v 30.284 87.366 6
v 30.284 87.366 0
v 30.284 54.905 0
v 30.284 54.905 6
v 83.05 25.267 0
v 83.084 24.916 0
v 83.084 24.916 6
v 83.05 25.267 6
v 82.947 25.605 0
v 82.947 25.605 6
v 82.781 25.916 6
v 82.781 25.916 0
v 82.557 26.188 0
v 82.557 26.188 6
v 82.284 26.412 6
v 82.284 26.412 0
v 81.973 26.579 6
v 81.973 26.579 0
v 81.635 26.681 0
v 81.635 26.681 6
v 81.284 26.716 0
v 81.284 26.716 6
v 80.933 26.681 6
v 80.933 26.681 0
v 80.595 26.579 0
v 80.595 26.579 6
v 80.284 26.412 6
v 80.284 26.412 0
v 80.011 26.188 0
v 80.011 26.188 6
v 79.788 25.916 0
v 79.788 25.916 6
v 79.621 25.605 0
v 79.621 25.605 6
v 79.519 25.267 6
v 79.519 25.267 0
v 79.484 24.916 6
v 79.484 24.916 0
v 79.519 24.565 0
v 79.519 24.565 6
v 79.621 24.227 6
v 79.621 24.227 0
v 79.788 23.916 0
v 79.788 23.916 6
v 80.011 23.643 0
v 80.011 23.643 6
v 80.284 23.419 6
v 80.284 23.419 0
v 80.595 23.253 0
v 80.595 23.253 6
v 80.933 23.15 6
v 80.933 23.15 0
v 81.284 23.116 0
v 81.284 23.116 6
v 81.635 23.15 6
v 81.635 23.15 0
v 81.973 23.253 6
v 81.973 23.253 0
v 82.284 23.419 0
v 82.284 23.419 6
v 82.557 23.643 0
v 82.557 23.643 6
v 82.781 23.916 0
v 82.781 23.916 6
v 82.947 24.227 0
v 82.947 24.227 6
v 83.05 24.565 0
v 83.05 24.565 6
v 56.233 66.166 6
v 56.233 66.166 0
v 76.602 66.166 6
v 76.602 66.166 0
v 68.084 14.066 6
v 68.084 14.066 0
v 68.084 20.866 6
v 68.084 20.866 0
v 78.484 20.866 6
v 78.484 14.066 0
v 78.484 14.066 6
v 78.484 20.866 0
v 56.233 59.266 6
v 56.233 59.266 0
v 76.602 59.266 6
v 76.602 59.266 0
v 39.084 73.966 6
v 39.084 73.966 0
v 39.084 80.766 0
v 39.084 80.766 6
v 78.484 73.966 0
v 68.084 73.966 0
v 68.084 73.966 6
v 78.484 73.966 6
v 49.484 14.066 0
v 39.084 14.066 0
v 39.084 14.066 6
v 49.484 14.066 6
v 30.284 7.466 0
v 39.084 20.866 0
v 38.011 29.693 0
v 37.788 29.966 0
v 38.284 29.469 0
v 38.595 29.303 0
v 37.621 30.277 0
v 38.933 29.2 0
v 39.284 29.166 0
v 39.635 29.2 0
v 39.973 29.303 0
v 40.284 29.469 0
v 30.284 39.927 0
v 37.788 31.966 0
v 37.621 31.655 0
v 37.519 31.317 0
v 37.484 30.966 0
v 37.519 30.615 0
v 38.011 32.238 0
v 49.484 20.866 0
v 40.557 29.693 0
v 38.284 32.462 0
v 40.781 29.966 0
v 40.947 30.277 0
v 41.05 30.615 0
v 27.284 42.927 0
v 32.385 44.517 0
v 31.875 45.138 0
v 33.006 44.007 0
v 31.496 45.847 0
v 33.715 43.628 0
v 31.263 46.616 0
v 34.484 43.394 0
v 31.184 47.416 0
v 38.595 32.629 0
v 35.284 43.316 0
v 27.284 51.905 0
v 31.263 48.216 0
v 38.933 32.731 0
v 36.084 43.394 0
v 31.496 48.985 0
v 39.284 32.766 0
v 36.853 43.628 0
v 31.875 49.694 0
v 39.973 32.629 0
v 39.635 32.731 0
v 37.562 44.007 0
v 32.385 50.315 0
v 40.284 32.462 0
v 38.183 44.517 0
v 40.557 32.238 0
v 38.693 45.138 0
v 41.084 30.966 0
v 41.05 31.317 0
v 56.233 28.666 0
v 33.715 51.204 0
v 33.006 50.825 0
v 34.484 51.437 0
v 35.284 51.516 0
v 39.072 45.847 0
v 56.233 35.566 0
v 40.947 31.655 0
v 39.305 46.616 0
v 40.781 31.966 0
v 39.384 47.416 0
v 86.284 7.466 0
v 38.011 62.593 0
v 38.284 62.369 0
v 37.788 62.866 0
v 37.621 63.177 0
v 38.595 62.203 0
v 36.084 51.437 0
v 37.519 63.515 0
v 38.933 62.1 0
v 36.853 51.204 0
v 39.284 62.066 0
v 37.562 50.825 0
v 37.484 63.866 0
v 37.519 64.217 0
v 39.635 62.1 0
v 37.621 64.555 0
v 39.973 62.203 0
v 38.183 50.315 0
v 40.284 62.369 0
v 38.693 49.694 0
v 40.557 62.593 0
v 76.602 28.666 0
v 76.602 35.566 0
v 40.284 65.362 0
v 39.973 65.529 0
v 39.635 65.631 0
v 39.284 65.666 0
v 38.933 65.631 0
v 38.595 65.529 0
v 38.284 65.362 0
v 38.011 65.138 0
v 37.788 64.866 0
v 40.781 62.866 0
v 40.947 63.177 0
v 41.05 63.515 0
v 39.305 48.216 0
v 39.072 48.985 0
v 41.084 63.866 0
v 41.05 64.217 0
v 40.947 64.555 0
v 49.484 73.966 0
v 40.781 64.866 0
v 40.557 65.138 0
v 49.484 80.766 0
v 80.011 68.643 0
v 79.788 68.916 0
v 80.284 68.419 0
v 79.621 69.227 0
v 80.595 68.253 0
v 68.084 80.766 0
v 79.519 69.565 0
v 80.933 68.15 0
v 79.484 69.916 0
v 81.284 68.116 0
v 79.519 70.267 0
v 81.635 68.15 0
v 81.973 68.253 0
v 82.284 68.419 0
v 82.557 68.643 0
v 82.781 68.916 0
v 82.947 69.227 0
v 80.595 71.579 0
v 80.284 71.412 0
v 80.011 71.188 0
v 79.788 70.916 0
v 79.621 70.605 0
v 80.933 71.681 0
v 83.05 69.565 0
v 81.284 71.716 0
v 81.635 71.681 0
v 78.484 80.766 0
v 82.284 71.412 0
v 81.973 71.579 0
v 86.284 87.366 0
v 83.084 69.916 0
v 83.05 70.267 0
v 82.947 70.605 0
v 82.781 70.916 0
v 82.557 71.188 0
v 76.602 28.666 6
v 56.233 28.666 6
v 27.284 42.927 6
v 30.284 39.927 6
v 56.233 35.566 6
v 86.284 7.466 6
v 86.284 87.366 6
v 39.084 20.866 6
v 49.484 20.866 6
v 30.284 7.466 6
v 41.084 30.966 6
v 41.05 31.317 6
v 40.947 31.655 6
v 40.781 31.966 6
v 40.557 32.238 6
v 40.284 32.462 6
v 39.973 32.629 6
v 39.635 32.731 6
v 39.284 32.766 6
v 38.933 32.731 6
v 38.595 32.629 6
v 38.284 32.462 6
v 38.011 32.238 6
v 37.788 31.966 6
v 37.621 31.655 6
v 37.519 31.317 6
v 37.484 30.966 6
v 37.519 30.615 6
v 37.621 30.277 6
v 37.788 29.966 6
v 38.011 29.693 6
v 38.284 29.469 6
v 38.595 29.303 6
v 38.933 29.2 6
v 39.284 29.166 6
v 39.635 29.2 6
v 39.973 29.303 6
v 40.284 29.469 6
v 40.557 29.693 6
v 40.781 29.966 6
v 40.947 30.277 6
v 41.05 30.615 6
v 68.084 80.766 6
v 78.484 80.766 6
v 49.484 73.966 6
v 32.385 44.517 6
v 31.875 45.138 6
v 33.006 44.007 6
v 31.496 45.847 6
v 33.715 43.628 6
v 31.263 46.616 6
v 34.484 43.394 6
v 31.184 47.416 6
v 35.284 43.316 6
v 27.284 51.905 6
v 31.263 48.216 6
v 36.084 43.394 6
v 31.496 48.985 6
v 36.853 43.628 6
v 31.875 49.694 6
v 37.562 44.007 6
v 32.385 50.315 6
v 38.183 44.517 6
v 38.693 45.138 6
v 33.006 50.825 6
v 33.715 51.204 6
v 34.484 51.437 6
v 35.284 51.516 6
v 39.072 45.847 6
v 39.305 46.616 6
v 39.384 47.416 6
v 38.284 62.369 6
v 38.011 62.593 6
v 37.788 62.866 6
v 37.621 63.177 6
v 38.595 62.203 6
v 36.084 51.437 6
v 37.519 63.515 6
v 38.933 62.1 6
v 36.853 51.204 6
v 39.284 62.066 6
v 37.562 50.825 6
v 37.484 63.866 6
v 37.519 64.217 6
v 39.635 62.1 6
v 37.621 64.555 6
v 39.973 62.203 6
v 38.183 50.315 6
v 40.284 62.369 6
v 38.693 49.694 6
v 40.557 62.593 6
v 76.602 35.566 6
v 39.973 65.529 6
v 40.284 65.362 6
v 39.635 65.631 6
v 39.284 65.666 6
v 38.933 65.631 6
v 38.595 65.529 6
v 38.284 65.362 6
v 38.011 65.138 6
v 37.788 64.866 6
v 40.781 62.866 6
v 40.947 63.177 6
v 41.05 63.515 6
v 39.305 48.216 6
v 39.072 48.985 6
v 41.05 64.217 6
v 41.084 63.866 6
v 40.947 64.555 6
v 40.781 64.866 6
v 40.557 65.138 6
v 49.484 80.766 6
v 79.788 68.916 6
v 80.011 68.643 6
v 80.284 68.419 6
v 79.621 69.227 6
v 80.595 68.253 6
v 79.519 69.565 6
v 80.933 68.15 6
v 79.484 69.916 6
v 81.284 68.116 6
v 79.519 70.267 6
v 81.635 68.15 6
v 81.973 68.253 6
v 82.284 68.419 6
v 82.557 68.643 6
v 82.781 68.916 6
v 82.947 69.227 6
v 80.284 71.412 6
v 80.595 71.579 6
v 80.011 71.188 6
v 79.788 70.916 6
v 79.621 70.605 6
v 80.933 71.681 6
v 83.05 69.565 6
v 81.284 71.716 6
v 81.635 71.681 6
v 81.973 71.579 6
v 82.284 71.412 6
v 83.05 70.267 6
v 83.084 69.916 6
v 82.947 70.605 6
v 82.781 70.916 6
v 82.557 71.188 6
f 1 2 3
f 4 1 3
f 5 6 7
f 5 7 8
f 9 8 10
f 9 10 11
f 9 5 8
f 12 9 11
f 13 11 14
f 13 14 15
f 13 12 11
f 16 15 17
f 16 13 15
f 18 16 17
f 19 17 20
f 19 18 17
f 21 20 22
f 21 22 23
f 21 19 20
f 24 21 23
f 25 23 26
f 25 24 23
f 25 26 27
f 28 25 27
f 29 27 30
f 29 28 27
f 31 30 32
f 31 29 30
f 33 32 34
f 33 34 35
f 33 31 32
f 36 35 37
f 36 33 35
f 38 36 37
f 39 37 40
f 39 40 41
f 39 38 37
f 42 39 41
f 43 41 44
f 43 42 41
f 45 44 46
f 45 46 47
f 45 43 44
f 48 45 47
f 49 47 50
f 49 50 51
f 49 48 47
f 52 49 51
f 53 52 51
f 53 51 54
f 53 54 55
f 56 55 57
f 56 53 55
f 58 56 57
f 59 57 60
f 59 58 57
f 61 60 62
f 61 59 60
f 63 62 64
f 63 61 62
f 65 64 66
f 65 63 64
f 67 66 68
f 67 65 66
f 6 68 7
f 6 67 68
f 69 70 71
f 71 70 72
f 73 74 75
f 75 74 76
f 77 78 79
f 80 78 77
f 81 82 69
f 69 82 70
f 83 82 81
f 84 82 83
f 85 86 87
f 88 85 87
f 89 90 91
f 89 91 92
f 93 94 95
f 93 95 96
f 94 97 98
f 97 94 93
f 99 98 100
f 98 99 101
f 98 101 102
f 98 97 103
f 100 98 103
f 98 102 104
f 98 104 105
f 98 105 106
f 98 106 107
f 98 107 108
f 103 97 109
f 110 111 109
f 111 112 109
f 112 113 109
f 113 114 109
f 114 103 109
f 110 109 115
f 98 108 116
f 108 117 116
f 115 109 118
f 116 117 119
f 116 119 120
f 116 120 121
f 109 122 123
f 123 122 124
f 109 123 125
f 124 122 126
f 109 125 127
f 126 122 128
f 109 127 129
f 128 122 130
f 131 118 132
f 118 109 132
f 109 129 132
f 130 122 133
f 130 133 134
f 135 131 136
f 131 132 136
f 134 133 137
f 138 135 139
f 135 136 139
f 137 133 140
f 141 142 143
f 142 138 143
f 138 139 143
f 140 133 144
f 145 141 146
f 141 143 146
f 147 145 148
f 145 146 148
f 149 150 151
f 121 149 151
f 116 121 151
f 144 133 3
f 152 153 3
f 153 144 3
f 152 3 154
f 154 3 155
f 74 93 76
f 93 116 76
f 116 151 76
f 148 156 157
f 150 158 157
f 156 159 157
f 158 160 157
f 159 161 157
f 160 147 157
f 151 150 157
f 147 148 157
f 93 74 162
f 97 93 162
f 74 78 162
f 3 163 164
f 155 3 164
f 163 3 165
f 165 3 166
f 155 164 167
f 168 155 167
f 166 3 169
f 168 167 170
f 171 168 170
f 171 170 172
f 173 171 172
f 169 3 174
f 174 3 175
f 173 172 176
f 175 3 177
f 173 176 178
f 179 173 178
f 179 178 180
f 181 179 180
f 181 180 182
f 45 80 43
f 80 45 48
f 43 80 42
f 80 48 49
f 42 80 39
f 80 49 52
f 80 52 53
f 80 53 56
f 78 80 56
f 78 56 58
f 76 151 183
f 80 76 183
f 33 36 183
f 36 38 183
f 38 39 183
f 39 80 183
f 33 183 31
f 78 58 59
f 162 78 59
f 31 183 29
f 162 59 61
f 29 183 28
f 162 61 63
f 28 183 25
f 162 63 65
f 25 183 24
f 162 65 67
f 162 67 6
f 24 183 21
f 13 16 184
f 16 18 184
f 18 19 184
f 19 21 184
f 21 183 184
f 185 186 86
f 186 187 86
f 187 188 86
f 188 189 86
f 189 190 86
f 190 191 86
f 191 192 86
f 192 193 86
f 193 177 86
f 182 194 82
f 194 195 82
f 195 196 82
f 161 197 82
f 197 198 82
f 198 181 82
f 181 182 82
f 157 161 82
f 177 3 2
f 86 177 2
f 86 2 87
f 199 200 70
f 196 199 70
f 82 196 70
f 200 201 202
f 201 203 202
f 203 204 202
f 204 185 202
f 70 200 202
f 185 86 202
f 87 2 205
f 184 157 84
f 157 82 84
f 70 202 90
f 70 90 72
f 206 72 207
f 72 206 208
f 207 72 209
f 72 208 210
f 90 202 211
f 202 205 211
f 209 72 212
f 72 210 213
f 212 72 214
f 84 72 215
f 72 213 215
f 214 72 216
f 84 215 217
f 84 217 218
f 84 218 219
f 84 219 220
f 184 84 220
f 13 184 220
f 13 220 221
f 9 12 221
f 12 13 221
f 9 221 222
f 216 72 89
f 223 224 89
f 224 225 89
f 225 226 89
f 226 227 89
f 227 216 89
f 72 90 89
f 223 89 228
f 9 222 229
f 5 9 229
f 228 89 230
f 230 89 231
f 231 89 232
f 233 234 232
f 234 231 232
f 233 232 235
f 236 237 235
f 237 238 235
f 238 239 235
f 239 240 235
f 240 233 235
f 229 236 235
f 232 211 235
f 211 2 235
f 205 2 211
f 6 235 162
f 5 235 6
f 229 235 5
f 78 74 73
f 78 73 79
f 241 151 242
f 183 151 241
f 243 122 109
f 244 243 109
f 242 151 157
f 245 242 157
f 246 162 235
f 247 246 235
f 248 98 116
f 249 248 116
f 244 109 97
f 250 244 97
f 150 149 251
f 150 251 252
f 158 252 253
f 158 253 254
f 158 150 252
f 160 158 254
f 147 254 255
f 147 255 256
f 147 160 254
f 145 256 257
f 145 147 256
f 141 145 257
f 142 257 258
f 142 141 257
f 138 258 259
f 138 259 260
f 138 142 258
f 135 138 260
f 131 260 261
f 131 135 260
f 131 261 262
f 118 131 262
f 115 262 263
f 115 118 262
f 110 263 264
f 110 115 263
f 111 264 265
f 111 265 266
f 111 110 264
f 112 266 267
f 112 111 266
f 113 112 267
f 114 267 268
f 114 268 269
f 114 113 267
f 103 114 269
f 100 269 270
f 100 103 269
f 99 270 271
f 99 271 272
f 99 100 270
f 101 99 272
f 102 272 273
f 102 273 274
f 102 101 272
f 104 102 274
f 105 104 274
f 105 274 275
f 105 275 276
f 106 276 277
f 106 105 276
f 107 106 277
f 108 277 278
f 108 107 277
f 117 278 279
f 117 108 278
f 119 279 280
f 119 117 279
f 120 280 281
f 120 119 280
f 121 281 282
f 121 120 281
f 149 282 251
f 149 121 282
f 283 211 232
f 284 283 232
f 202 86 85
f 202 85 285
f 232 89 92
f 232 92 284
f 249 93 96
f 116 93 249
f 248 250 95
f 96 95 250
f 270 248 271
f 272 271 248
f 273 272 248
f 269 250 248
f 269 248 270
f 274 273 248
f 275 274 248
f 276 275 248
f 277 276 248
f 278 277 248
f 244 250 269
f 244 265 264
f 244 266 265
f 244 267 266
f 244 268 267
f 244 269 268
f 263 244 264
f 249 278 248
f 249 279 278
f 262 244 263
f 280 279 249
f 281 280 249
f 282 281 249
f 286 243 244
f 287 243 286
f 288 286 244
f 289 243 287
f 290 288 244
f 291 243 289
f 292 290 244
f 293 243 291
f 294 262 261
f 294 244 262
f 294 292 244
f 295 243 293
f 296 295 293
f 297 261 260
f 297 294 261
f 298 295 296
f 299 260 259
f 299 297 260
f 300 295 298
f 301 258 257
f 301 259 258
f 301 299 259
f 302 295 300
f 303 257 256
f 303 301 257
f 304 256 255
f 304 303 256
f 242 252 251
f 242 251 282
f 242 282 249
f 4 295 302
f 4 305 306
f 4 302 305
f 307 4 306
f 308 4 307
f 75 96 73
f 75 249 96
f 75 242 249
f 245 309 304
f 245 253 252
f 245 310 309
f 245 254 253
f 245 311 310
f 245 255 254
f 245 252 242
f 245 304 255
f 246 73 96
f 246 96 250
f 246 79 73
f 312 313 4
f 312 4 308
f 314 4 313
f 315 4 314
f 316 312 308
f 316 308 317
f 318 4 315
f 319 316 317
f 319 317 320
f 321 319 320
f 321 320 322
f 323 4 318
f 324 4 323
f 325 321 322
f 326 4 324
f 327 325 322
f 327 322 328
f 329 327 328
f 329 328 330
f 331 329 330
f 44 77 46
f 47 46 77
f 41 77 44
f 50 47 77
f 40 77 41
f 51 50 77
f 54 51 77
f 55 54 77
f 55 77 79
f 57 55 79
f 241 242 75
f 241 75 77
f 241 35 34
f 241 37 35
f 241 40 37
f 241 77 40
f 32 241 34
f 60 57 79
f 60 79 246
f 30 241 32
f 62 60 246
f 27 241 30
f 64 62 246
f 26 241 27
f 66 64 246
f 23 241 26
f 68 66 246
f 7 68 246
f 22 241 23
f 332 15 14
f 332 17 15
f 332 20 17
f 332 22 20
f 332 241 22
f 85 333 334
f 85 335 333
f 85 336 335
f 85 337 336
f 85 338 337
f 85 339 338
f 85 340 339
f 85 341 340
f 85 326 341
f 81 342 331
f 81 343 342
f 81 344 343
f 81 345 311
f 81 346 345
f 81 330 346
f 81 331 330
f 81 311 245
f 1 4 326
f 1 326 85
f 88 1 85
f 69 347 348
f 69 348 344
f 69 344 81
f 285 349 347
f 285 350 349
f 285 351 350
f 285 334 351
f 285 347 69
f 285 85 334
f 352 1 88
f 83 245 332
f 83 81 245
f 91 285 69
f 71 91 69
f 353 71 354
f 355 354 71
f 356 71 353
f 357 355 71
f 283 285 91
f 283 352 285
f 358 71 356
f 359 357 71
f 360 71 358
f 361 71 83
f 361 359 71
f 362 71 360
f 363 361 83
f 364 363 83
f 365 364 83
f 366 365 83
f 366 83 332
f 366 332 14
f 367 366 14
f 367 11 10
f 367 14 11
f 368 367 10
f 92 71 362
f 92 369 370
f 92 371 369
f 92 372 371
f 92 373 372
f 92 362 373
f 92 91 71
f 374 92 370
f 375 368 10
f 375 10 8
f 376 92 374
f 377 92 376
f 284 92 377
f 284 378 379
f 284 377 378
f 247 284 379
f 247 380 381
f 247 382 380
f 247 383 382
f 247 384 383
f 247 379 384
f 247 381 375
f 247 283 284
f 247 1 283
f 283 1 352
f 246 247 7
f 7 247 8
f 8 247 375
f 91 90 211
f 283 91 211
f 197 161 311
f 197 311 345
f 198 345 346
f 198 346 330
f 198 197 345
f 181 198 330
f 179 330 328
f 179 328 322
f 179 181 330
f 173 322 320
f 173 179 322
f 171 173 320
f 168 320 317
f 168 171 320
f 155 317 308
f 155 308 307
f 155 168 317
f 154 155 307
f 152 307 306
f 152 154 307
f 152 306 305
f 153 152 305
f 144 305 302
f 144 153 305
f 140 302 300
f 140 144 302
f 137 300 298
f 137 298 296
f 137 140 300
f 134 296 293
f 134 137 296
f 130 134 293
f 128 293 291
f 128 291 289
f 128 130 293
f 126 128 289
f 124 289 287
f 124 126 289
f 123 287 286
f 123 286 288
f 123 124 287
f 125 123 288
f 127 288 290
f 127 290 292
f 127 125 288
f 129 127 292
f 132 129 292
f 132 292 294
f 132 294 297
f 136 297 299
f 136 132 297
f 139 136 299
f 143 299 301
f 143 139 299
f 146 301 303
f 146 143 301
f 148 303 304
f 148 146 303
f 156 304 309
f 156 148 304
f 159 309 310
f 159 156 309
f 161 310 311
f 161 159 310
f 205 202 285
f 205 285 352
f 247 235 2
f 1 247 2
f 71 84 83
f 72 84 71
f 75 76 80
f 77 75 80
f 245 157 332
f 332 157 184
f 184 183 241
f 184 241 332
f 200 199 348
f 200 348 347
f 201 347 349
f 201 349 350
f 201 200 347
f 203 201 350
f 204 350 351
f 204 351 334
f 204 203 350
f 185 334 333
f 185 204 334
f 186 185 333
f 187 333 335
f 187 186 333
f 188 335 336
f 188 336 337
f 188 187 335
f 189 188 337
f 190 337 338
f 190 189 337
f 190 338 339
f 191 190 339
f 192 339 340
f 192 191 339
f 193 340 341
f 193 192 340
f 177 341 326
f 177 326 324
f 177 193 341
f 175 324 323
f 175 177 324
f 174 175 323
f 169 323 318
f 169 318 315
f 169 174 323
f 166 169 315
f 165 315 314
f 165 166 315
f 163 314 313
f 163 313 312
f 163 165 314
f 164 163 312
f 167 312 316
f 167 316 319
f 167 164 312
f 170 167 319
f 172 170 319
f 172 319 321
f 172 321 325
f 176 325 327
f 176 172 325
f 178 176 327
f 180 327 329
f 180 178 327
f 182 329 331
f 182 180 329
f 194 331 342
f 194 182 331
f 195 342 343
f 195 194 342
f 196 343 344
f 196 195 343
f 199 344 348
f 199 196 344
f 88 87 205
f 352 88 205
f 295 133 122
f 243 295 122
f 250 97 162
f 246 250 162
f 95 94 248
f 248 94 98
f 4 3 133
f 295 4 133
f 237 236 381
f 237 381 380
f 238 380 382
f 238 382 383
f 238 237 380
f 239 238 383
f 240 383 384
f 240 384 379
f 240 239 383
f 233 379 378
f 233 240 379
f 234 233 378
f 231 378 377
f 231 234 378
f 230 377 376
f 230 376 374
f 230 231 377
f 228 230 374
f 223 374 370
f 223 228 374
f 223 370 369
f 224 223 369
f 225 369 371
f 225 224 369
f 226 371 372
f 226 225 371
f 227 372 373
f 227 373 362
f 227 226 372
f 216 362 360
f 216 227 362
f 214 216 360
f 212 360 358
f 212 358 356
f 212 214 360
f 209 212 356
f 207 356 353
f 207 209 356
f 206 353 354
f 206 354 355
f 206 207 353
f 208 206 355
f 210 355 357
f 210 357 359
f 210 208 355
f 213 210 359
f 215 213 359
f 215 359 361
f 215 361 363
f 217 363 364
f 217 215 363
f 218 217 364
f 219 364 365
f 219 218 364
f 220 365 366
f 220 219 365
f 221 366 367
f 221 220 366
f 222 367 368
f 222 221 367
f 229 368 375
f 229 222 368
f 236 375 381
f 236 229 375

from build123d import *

# Parameters (mm, degrees)
MODEL_R                  = 1.8
MODEL_R_2                = 4.1
MODEL_W                  = 20.368459162
MODEL_H                  = 6.9
MODEL_W_2                = 10.4
MODEL_H_2                = 6.8
RESSALTO_EXTRUS_O1_DEPTH = 6


with BuildPart() as part:
    # Model → Ressalto-extrusão1 (new body)
    with BuildSketch(Plane.XY):
        Polygon((86.284167453, 87.365706057), (30.284167453, 87.365706057), (30.284167453, 54.904792152), (27.284167453, 51.904792152), (27.284167453, 42.926619963), (30.284167453, 39.926619963), (30.284167453, 7.465706057), (86.284167453, 7.465706057), align=None)
        with Locations((39.284167453, 30.965706057)):
            Circle(MODEL_R, mode=Mode.SUBTRACT)
        with Locations((81.284167453, 24.915706057)):
            Circle(MODEL_R, mode=Mode.SUBTRACT)
        with Locations((81.284167453, 69.915706057)):
            Circle(MODEL_R, mode=Mode.SUBTRACT)
        with Locations((39.284167453, 63.865706057)):
            Circle(MODEL_R, mode=Mode.SUBTRACT)
        with Locations((35.284167453, 47.415706057)):
            Circle(MODEL_R_2, mode=Mode.SUBTRACT)
        with Locations((66.417398963, 32.115706057)):
            Rectangle(MODEL_W, MODEL_H, mode=Mode.SUBTRACT)
        with Locations((44.284167453, 17.465706057)):
            Rectangle(MODEL_W_2, MODEL_H_2, mode=Mode.SUBTRACT)
        with Locations((44.284167453, 77.365706057)):
            Rectangle(MODEL_W_2, MODEL_H_2, mode=Mode.SUBTRACT)
        with Locations((66.417398963, 62.715706057)):
            Rectangle(MODEL_W, MODEL_H, mode=Mode.SUBTRACT)
        with Locations((73.284167453, 17.465706057)):
            Rectangle(MODEL_W_2, MODEL_H_2, mode=Mode.SUBTRACT)
        with Locations((73.284167453, 77.365706057)):
            Rectangle(MODEL_W_2, MODEL_H_2, mode=Mode.SUBTRACT)
    extrude(amount=RESSALTO_EXTRUS_O1_DEPTH)


solid = part.part
